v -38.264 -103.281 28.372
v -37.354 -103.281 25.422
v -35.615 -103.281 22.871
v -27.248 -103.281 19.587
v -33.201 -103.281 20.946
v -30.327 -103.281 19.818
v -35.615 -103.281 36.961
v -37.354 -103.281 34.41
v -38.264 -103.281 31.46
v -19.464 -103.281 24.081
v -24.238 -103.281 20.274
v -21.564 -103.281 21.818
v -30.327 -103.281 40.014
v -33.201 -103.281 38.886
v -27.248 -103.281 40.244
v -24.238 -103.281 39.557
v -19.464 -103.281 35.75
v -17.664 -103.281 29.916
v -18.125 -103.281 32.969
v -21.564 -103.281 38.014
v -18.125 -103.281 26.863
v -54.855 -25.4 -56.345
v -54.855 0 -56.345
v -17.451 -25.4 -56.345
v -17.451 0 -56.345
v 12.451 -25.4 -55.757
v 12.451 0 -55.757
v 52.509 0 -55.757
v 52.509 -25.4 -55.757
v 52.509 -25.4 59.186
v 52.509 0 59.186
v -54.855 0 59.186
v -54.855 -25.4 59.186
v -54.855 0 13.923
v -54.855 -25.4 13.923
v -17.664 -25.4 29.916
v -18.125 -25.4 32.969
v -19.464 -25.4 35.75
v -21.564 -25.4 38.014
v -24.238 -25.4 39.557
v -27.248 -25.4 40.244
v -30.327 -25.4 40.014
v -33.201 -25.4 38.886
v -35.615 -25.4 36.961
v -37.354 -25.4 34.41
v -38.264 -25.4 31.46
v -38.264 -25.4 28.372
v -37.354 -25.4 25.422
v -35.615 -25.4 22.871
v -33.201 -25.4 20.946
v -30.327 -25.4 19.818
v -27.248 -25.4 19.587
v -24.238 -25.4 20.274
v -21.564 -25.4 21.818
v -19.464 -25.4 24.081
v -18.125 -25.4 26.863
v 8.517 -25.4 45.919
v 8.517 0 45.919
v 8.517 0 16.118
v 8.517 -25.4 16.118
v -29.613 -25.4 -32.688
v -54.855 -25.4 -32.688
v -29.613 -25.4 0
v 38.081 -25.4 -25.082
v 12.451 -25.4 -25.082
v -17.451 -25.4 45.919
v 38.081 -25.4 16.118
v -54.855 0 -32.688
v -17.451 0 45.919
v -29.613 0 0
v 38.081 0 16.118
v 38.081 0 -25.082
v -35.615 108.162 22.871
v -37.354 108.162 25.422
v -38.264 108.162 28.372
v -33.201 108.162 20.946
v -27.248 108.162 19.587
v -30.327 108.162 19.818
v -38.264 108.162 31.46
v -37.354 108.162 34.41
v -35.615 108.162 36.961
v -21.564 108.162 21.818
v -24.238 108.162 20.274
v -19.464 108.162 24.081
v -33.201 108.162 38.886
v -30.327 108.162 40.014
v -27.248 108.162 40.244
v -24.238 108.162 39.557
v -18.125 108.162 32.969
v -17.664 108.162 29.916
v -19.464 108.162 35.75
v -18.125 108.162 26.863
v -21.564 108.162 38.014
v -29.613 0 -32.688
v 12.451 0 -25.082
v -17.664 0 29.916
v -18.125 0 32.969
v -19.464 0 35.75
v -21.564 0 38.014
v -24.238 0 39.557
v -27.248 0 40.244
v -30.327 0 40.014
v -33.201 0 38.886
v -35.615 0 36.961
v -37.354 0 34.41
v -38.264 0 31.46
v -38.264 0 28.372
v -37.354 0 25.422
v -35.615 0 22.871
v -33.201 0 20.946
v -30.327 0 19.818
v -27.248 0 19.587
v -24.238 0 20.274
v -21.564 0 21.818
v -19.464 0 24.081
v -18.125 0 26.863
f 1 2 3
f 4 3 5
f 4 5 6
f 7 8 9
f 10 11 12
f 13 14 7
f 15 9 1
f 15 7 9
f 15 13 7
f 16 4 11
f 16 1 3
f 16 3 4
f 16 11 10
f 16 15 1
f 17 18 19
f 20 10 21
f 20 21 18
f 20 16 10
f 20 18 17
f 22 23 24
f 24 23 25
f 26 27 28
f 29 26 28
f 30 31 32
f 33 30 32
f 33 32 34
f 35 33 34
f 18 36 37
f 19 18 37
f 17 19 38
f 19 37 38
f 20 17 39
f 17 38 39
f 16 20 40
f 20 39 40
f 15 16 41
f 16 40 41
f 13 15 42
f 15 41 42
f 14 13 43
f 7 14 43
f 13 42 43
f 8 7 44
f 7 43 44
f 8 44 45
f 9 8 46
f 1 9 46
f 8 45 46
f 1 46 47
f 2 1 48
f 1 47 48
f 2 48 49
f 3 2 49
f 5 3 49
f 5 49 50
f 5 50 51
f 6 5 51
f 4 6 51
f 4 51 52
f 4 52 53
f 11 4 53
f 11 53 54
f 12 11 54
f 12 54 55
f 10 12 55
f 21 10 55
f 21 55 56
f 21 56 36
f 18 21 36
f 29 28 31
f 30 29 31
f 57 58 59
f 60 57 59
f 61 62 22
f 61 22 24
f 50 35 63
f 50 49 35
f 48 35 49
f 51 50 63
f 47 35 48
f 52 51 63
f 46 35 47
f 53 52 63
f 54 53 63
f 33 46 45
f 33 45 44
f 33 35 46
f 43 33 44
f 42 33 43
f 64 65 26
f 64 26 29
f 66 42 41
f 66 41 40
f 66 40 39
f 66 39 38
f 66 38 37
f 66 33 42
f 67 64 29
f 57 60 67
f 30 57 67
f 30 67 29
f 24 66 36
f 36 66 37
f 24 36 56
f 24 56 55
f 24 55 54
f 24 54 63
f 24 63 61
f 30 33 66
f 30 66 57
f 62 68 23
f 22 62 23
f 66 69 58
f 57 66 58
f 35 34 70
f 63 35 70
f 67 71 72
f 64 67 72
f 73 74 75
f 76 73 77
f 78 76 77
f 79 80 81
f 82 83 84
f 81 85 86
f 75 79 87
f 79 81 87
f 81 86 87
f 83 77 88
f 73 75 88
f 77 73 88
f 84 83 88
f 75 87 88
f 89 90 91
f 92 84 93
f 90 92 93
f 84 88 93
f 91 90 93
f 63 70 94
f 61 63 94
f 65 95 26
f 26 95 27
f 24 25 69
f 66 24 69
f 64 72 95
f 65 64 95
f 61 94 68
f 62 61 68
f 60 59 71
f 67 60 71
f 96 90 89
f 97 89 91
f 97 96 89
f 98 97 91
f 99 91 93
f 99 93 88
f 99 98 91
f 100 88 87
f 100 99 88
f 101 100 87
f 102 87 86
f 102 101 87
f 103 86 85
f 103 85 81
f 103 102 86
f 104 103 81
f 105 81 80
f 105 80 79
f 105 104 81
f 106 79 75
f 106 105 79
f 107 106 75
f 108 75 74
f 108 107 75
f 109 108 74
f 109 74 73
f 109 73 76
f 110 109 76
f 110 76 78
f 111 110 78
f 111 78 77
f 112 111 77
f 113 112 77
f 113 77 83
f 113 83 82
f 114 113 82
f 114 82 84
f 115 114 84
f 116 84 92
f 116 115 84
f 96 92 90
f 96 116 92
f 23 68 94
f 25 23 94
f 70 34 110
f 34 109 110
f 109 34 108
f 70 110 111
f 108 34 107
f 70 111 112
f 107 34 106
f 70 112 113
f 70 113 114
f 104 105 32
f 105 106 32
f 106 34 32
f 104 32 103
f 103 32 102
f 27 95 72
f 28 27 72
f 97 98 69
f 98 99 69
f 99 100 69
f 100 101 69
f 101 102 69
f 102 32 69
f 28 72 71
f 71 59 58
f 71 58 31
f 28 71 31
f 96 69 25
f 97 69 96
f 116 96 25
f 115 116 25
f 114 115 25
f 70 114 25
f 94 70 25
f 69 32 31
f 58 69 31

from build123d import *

# Parameters (mm, degrees)
F1_DEPTH      = 25.4
F2_R          = 10.3575918664
F3_DEPTH      = 82.7624946833
F3_DEPTH_BACK = 25.4
F4_DEPTH      = 25.4
F5_DEPTH      = 211.4430963993


with BuildPart() as f1:
    # F0 (on Front) → F1 (new body)
    with BuildSketch(Plane.XZ):
        Polygon((-54.8551306129, 59.1857582331), (-54.8551306129, 13.9228226617), (-29.6127572656, 0), (-29.6127572656, -32.6884873211), (-54.8551306129, -32.6884873211), (-54.8551306129, -56.3453622162), (-17.4506641924, -56.3453622162), (-17.4506641924, 45.9188297391), (8.5172532126, 45.9188297391), (8.5172532126, 16.1184109747), (38.0811914802, 16.1184109747), (38.0811914802, -25.0818282366), (12.4506652355, -25.0818282366), (12.4506652355, -55.7573884726), (52.5093525648, -55.7573884726), (52.5093525648, 59.1857582331), align=None)
    extrude(amount=F1_DEPTH)

    # F2 (on Front) → F3 (join, two sides)
    with BuildSketch(Plane.XZ) as f3_sk:
        with Locations((-28.0219614506, 29.9158245325)):
            Circle(F2_R)
    extrude(amount=-F3_DEPTH)
    extrude(f3_sk.sketch, amount=F3_DEPTH_BACK)

    # F4 (add): a face of the model
    f4_faces = [f1.faces().sort_by_distance(p)[0] for p in [
        (-28.0219614506, 82.7624946833, 29.9158245325),
    ]]
    extrude(f4_faces, amount=F4_DEPTH)

    # F5 (add): a face of the model
    f5_faces = [f1.faces().sort_by_distance(p)[0] for p in [
        (-28.0219614506, 108.1624946833, 29.9158245325),
    ]]
    extrude(f5_faces, amount=-F5_DEPTH)


solid = f1.part
